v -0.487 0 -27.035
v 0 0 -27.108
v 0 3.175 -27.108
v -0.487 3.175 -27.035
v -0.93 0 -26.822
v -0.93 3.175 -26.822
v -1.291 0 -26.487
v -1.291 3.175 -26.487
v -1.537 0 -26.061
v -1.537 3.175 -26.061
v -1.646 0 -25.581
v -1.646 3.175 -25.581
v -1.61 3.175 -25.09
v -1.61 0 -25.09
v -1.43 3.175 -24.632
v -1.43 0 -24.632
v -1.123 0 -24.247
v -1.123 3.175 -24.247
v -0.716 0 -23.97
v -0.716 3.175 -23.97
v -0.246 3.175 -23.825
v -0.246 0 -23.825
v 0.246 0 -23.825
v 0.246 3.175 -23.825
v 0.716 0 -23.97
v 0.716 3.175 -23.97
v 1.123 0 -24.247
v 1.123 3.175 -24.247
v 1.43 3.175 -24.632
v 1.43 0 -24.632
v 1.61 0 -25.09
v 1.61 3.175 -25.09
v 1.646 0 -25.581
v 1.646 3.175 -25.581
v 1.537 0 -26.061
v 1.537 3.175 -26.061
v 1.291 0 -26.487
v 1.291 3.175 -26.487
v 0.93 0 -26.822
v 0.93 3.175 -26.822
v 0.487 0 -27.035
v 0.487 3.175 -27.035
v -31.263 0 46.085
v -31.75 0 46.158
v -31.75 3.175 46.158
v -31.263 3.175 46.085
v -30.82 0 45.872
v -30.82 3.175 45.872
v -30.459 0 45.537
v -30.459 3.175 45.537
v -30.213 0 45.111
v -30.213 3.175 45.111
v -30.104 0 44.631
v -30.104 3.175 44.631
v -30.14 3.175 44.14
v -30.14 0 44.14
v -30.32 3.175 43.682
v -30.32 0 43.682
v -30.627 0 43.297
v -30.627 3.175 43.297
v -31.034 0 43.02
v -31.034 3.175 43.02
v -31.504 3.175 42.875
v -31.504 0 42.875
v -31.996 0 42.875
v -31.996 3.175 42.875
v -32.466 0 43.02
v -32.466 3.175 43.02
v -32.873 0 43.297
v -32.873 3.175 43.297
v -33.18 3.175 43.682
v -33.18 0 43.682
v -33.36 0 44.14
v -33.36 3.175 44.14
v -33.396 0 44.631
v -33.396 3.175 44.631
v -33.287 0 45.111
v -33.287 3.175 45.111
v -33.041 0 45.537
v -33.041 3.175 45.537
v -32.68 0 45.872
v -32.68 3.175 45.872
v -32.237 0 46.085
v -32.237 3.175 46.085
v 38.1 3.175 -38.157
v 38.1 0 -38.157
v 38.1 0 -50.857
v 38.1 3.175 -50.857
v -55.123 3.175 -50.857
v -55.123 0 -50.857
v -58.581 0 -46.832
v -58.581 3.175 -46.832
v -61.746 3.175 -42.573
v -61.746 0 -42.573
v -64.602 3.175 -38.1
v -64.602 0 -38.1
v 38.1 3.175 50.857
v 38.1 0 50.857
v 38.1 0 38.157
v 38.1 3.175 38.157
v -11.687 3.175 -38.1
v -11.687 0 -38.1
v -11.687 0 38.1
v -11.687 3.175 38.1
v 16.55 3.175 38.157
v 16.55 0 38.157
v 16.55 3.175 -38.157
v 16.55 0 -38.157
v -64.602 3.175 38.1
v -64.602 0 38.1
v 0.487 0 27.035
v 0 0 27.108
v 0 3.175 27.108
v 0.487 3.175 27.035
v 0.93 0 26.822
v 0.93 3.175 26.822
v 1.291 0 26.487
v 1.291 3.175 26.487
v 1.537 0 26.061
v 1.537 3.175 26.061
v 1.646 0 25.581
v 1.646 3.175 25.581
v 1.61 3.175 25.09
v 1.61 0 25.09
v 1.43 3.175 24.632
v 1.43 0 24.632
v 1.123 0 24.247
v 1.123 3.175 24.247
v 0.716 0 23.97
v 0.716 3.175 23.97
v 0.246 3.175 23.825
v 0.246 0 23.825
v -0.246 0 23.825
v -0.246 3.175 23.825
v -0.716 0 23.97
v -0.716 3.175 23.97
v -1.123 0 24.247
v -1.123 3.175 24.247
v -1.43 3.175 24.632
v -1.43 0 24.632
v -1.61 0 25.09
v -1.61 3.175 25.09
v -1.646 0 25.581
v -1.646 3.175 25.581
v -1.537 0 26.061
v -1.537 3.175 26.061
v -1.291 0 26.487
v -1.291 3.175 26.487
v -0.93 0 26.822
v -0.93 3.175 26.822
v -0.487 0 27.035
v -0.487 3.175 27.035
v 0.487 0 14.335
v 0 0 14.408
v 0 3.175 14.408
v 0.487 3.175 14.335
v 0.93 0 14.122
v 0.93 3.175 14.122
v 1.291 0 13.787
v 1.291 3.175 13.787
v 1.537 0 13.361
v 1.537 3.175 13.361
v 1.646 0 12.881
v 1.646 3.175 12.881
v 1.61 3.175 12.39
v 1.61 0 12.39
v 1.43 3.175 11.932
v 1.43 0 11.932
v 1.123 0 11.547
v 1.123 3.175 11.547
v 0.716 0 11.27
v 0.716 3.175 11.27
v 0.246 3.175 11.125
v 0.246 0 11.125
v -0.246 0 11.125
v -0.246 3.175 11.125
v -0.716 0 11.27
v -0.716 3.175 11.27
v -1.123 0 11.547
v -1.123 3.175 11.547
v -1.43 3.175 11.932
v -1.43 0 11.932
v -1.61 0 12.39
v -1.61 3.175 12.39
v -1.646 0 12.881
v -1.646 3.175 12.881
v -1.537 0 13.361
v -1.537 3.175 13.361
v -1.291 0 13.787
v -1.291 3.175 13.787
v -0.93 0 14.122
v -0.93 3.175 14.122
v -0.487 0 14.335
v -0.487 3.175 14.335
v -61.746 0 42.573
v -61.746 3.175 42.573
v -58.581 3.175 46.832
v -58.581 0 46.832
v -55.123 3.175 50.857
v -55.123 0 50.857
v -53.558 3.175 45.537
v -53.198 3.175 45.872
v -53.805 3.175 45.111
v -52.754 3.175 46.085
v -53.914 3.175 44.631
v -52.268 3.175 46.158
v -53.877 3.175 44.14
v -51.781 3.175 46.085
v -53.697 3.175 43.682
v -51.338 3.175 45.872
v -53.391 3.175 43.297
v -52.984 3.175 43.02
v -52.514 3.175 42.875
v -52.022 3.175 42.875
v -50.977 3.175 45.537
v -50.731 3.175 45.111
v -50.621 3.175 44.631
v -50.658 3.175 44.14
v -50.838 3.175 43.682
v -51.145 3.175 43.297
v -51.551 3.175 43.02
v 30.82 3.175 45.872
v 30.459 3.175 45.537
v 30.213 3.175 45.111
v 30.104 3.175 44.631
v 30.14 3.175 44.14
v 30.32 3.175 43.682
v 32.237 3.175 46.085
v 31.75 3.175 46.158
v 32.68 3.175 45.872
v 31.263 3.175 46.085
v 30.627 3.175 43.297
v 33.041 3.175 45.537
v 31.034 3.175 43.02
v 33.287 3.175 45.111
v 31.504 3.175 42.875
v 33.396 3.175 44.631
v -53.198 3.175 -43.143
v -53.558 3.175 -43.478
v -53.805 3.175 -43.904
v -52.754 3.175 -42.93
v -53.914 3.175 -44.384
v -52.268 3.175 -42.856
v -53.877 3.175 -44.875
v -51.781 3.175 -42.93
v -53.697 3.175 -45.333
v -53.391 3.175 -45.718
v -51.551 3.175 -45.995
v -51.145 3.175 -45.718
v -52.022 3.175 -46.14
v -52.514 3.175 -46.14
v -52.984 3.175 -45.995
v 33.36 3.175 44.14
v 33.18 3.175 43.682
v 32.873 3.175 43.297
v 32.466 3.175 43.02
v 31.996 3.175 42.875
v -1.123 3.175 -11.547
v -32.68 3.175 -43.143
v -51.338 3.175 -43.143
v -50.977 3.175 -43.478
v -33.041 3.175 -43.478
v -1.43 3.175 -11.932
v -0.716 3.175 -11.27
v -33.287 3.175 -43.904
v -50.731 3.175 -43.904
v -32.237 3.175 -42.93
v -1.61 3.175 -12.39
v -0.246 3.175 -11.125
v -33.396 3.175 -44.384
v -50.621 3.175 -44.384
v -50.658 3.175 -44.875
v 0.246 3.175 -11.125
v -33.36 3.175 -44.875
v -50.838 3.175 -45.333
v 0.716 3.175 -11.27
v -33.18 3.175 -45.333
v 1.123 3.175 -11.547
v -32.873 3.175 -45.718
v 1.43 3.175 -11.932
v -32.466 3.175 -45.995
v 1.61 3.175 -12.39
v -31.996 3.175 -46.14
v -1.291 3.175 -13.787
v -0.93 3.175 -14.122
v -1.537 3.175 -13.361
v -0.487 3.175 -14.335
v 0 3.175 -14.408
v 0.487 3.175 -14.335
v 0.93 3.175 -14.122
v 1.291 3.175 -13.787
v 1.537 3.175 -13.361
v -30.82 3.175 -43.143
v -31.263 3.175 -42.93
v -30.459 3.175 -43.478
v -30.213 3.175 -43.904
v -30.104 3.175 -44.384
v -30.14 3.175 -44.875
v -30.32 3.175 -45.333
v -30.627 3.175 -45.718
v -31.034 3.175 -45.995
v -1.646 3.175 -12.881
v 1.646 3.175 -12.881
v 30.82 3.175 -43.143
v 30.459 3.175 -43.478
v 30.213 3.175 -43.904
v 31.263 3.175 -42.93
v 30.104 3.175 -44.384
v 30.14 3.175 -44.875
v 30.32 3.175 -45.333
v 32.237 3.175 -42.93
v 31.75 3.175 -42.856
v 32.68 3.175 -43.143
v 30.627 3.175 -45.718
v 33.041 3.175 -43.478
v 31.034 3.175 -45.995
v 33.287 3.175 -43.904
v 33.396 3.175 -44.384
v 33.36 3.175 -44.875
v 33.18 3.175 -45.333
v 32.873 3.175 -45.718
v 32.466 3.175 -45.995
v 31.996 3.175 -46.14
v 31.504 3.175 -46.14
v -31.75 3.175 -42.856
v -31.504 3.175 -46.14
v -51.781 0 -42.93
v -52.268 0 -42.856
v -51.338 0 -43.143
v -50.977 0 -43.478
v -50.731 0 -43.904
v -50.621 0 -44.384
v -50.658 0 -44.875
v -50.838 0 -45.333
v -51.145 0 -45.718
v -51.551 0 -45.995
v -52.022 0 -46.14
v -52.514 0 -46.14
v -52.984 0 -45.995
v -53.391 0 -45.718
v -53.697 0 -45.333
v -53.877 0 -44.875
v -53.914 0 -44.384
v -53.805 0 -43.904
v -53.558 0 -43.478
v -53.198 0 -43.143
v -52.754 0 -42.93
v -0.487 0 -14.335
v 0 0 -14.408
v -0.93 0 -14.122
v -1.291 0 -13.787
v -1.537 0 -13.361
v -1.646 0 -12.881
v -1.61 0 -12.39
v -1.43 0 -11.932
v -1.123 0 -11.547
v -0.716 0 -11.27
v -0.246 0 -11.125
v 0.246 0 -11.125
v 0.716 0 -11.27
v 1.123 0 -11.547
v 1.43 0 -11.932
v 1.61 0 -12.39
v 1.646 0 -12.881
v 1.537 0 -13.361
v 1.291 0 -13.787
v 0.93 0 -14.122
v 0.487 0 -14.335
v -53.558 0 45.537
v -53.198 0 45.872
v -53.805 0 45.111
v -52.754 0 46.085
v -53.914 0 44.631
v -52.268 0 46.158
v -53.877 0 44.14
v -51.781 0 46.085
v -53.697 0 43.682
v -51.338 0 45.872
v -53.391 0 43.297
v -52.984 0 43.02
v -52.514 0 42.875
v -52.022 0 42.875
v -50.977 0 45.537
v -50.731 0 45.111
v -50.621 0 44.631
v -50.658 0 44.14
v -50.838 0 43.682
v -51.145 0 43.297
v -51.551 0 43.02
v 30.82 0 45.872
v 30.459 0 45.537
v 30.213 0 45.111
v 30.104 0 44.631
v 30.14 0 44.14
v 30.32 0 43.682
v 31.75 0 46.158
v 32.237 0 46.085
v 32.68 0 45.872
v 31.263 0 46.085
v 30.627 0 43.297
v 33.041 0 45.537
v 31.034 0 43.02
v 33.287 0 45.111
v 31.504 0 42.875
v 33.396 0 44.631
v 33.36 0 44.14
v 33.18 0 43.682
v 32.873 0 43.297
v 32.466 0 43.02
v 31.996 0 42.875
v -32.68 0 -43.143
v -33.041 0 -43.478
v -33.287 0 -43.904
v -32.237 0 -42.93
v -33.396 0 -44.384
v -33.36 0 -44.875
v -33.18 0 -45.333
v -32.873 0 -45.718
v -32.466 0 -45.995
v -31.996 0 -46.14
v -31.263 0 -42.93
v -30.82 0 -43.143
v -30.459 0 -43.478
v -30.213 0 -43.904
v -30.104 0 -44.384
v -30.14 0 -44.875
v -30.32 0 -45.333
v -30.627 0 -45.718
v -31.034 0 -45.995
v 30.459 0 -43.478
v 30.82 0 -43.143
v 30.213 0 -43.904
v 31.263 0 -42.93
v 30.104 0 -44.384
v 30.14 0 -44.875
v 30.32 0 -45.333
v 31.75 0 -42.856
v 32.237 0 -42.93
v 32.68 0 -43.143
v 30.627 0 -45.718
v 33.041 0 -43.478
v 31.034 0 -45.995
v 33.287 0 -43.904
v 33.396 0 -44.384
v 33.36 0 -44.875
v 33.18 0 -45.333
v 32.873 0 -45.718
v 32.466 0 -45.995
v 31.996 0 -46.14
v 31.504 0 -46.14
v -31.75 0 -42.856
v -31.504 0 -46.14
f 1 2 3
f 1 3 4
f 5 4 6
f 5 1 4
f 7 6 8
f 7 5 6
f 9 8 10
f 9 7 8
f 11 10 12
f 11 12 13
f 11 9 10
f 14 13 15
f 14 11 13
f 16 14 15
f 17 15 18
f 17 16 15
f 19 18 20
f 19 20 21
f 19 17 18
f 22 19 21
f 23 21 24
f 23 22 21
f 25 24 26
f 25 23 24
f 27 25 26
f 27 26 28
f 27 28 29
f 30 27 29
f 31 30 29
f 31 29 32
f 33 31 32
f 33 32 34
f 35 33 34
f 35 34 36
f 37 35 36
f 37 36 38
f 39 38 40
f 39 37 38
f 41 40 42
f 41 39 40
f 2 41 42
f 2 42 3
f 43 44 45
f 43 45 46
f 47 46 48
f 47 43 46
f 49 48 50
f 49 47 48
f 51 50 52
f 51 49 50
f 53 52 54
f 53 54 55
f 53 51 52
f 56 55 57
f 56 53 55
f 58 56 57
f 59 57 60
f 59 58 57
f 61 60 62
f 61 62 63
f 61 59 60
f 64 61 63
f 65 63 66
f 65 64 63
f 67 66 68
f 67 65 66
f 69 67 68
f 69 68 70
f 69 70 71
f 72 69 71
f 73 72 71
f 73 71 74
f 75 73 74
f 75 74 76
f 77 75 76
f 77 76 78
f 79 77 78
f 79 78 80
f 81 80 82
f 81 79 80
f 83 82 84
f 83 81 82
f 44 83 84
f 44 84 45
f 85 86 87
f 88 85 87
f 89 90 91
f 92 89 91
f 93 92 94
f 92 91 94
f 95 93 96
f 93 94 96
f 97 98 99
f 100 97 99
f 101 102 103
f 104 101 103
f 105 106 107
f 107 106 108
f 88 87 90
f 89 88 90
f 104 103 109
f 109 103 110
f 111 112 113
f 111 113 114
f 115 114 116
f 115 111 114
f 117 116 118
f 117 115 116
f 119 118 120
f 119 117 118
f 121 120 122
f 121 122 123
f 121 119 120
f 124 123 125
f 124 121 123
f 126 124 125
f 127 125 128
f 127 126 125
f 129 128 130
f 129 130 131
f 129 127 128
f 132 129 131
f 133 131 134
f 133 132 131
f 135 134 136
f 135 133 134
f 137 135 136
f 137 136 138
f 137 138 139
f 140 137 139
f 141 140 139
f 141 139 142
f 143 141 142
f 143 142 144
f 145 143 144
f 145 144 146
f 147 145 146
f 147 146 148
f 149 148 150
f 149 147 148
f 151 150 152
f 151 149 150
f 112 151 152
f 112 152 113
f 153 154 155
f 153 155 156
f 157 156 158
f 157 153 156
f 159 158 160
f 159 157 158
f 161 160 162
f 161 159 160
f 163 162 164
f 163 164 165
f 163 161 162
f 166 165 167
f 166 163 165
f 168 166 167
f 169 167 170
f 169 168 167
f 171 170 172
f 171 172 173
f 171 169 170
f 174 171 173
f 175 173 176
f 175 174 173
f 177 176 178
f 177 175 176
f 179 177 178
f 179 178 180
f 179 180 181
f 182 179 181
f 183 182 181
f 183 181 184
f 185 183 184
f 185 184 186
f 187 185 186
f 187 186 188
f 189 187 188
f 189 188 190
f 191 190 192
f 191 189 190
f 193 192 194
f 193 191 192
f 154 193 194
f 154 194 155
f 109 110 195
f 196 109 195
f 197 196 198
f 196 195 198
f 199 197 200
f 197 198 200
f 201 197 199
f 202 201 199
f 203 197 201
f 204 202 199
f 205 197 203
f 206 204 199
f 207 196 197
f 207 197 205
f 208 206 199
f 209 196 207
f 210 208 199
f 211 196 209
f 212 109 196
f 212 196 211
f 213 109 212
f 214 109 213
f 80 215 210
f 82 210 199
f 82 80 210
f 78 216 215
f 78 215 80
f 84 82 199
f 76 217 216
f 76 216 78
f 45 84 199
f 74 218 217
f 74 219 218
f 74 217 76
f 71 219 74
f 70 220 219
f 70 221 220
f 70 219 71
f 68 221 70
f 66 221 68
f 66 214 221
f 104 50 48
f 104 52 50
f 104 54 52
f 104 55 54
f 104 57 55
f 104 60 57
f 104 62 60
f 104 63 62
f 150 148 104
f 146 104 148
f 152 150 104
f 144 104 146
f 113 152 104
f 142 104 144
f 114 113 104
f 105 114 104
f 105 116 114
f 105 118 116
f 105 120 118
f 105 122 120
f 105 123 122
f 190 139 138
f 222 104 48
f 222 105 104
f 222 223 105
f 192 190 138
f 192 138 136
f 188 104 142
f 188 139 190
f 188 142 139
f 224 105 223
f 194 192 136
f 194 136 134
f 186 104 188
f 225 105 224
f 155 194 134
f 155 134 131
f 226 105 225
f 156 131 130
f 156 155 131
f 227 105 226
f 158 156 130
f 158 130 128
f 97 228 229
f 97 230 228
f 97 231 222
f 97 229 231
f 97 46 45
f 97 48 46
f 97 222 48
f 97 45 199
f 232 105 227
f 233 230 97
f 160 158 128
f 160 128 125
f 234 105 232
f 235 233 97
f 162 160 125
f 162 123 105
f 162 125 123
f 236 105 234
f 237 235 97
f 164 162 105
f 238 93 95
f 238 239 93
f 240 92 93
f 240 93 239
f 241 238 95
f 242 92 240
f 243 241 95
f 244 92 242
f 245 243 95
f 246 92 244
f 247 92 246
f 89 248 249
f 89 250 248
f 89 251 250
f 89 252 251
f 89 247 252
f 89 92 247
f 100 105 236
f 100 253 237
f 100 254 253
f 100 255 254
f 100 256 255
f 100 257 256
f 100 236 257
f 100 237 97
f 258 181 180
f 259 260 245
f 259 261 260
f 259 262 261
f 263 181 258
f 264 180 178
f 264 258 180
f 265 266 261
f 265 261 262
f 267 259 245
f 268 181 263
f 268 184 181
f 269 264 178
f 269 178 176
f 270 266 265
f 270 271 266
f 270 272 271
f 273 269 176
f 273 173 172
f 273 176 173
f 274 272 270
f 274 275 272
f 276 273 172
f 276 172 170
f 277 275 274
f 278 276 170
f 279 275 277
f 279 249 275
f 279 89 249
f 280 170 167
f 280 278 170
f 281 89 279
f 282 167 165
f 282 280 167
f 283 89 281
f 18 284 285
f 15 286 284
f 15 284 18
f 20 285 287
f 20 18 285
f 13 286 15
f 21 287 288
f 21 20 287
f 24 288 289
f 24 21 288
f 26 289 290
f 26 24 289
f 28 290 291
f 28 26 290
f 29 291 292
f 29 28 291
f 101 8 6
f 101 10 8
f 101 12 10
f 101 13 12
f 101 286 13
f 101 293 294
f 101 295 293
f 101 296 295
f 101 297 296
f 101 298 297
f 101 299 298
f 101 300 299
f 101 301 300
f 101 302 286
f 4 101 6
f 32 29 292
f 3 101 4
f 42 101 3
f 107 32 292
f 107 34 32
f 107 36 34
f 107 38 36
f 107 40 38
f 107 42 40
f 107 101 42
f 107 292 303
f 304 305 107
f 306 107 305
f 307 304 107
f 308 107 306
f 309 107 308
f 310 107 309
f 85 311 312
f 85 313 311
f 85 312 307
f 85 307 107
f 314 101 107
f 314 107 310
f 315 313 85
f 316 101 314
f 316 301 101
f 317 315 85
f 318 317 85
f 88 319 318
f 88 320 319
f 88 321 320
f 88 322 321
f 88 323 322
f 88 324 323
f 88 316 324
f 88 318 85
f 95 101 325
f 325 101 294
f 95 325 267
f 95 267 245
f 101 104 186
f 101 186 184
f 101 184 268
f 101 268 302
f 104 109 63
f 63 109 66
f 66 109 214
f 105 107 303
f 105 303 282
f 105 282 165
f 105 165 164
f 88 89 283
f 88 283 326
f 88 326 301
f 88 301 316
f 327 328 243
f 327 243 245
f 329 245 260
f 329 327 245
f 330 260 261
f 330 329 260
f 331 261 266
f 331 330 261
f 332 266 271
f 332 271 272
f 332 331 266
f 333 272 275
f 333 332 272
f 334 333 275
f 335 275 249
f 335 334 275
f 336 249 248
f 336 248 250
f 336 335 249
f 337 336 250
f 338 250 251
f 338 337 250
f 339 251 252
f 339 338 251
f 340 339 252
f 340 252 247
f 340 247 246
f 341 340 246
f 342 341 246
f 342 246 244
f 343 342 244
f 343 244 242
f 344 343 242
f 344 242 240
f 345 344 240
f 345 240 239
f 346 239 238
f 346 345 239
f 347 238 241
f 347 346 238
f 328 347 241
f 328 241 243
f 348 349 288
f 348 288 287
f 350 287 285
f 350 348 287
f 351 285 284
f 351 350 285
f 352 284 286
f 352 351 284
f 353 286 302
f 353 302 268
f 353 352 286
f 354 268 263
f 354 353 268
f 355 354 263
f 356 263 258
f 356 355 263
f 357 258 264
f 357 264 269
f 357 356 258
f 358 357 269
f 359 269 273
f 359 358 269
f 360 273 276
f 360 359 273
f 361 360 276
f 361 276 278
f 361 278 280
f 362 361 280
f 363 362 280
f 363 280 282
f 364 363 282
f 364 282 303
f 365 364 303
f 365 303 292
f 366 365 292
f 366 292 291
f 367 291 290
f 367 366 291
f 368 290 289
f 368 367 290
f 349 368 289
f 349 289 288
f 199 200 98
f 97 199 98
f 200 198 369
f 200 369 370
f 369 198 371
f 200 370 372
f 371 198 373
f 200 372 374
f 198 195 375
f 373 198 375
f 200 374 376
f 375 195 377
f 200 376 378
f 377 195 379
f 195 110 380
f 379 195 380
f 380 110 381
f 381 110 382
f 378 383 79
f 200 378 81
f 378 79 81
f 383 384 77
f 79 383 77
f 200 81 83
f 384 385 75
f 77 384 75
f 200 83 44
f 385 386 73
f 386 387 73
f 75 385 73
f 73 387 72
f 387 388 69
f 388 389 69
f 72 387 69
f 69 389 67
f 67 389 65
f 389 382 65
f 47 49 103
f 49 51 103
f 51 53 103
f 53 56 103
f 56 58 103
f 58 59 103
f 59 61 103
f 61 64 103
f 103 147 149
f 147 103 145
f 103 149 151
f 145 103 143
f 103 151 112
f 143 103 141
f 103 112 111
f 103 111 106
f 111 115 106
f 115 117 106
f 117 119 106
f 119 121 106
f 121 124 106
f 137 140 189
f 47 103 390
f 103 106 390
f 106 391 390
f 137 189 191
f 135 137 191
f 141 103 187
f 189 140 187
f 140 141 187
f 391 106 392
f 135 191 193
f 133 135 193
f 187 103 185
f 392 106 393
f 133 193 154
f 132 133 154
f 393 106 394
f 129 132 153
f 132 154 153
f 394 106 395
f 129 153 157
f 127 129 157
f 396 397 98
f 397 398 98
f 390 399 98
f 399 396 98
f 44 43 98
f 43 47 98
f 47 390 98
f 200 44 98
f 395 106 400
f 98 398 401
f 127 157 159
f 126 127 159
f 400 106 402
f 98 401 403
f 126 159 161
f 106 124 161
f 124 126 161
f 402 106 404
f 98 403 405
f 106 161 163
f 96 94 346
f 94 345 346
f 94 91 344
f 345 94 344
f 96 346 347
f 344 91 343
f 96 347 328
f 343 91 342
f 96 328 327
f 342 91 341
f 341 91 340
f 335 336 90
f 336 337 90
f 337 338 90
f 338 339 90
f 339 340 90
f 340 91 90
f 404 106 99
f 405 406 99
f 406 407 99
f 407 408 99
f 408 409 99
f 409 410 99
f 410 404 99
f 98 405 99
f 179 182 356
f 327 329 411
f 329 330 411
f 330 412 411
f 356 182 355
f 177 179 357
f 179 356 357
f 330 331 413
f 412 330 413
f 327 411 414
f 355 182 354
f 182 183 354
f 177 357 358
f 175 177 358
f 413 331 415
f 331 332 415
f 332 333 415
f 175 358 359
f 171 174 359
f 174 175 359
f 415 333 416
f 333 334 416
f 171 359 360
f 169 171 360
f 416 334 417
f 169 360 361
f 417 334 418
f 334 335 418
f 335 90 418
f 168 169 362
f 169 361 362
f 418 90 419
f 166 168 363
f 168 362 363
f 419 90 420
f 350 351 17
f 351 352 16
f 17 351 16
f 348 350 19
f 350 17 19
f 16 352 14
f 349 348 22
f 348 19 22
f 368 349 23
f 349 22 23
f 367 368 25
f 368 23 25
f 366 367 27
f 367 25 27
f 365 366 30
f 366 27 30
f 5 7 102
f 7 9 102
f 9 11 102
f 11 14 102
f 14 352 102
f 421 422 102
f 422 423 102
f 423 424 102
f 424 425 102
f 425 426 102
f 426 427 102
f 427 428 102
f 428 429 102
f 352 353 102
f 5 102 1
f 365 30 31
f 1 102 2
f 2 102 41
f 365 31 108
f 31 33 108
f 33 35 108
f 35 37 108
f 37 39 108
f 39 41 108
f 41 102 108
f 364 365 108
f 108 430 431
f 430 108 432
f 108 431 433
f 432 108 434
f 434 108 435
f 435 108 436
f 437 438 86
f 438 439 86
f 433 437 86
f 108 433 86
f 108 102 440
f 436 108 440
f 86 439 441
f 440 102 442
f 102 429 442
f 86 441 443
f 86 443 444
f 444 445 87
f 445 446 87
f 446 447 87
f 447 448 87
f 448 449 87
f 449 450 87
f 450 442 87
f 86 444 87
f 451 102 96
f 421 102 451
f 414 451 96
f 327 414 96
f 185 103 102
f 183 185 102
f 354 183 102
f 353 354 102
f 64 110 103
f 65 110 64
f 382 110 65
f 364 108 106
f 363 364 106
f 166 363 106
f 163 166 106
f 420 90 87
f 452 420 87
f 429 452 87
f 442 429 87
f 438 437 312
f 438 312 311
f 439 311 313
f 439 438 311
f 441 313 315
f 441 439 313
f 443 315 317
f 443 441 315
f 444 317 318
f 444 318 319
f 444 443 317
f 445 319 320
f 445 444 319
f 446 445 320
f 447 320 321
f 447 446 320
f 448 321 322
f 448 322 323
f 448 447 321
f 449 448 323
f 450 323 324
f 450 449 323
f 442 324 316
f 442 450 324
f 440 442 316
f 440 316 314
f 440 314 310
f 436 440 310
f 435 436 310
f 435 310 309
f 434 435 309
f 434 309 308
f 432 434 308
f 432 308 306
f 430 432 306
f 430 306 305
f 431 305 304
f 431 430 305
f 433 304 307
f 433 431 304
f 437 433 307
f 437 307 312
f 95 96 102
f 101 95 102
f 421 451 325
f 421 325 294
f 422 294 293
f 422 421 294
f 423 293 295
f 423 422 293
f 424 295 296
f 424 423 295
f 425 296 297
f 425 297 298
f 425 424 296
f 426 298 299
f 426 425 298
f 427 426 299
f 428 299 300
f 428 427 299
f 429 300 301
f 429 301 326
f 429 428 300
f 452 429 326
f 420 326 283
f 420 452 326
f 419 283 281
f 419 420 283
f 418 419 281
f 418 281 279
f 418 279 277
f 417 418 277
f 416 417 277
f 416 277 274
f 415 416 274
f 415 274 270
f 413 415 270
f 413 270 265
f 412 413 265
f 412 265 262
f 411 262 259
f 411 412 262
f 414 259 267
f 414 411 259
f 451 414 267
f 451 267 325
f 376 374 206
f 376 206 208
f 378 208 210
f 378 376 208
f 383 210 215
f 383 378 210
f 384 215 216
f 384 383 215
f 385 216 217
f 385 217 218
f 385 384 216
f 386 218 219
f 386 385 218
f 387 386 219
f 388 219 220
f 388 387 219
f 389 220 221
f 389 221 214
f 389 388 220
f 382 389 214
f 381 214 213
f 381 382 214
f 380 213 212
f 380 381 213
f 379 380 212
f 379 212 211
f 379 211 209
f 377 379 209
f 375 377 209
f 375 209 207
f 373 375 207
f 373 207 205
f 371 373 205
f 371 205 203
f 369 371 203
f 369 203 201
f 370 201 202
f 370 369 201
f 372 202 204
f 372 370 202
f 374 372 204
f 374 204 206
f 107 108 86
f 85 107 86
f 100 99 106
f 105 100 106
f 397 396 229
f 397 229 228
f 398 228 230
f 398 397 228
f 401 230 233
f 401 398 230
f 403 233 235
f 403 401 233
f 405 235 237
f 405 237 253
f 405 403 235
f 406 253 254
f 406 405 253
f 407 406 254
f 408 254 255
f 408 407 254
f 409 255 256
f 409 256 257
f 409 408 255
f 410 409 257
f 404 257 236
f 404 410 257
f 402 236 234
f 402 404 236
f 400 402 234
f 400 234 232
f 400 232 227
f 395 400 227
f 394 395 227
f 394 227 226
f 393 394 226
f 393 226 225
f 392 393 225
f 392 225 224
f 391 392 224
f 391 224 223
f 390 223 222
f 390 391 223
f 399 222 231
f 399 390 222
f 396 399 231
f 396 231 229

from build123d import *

# Parameters (mm, degrees)
SKETCH1_R           = 1.651
BOSS_EXTRUDE1_DEPTH = 3.175
CUT_EXTRUDE1_START  = -3.175
CUT_EXTRUDE1_DEPTH  = 3.175


with BuildPart() as part:
    # Sketch1 → Boss-Extrude1 (new body)
    with BuildSketch(Plane(origin=(0, 0, 0), x_dir=(1, 0, 0), z_dir=(0, 1, 0))):
        with BuildLine():
            Line((-73.916912814, 12.7), (-73.916912814, -12.7))
            ThreePointArc((-73.916912814, -12.7), (-67.281551776, -33.138991997), (-55.122759171, -50.857461806))
            Line((-55.122759171, -50.857461806), (55.122759171, -50.857461806))
            ThreePointArc((55.122759171, -50.857461806), (61.833234068, -42.445861574), (67.270928268, -33.160552015))
            ThreePointArc((67.270928268, -33.160552015), (47.932265908, 0), (67.270928268, 33.160552015))
            ThreePointArc((67.270928268, 33.160552015), (61.833234068, 42.445861574), (55.122759171, 50.857461806))
            Line((55.122759171, 50.857461806), (-55.122759171, 50.857461806))
            ThreePointArc((-55.122759171, 50.857461806), (-67.281551776, 33.138991997), (-73.916912814, 12.7))
        make_face()
        with Locations(Location((0, -12.757461806, 0), (0, 0, 270))):
            Circle(SKETCH1_R, mode=Mode.SUBTRACT)
        with Locations(Location((0, -25.457461806, 0), (0, 0, 270))):
            Circle(SKETCH1_R, mode=Mode.SUBTRACT)
        with Locations(Location((31.75, -44.507461806, 0), (0, 0, 270))):
            Circle(SKETCH1_R, mode=Mode.SUBTRACT)
        with Locations(Location((-31.75, -44.507461806, 0), (0, 0, 270))):
            Circle(SKETCH1_R, mode=Mode.SUBTRACT)
        with Locations(Location((-52.26766059, 44.507461806, 0), (0, 0, 270))):
            Circle(SKETCH1_R, mode=Mode.SUBTRACT)
        with Locations(Location((-52.26766059, -44.507461806, 0), (0, 0, 270))):
            Circle(SKETCH1_R, mode=Mode.SUBTRACT)
        with Locations(Location((-31.75, 44.507461806, 0), (0, 0, 270))):
            Circle(SKETCH1_R, mode=Mode.SUBTRACT)
        with Locations(Location((31.75, 44.507461806, 0), (0, 0, 270))):
            Circle(SKETCH1_R, mode=Mode.SUBTRACT)
        with Locations(Location((0, 25.457461806, 0), (0, 0, 90))):
            Circle(SKETCH1_R, mode=Mode.SUBTRACT)
        with Locations(Location((0, 12.757461806, 0), (0, 0, 90))):
            Circle(SKETCH1_R, mode=Mode.SUBTRACT)
    extrude(amount=BOSS_EXTRUDE1_DEPTH)

    # Sketch2 → Cut-Extrude1 (cut)
    with BuildSketch(Plane(origin=(0, 3.175, 0), x_dir=(1, 0, 0), z_dir=(0, 1, 0)).offset(CUT_EXTRUDE1_START)):
        with BuildLine():
            Line((38.1, -50.857461806), (38.1, -38.157461806))
            Line((38.1, -38.157461806), (16.550455454, -38.157461806))
            Line((16.550455454, -38.157461806), (16.550455454, 38.157461806))
            Line((16.550455454, 38.157461806), (38.1, 38.157461806))
            Line((38.1, 38.157461806), (38.1, 50.857461806))
            Line((38.1, 50.857461806), (55.122759171, 50.857461806))
            ThreePointArc((55.122759171, 50.857461806), (61.833234068, 42.445861574), (67.270928268, 33.160552015))
            ThreePointArc((67.270928268, 33.160552015), (47.932265908, 0), (67.270928268, -33.160552015))
            ThreePointArc((67.270928268, -33.160552015), (61.833234068, -42.445861574), (55.122759171, -50.857461806))
            Line((55.122759171, -50.857461806), (38.1, -50.857461806))
        make_face()
        with BuildLine():
            Line((-64.601780161, 38.1), (-11.686912814, 38.1))
            Line((-11.686912814, 38.1), (-11.686912814, -38.1))
            Line((-11.686912814, -38.1), (-64.601780161, -38.1))
            ThreePointArc((-64.601780161, -38.1), (-70.414111341, -25.823495582), (-73.916912814, -12.7))
            Line((-73.916912814, -12.7), (-73.916912814, 12.7))
            ThreePointArc((-73.916912814, 12.7), (-70.414111341, 25.823495582), (-64.601780161, 38.1))
        make_face()
    extrude(amount=CUT_EXTRUDE1_DEPTH, mode=Mode.SUBTRACT)


solid = part.part
